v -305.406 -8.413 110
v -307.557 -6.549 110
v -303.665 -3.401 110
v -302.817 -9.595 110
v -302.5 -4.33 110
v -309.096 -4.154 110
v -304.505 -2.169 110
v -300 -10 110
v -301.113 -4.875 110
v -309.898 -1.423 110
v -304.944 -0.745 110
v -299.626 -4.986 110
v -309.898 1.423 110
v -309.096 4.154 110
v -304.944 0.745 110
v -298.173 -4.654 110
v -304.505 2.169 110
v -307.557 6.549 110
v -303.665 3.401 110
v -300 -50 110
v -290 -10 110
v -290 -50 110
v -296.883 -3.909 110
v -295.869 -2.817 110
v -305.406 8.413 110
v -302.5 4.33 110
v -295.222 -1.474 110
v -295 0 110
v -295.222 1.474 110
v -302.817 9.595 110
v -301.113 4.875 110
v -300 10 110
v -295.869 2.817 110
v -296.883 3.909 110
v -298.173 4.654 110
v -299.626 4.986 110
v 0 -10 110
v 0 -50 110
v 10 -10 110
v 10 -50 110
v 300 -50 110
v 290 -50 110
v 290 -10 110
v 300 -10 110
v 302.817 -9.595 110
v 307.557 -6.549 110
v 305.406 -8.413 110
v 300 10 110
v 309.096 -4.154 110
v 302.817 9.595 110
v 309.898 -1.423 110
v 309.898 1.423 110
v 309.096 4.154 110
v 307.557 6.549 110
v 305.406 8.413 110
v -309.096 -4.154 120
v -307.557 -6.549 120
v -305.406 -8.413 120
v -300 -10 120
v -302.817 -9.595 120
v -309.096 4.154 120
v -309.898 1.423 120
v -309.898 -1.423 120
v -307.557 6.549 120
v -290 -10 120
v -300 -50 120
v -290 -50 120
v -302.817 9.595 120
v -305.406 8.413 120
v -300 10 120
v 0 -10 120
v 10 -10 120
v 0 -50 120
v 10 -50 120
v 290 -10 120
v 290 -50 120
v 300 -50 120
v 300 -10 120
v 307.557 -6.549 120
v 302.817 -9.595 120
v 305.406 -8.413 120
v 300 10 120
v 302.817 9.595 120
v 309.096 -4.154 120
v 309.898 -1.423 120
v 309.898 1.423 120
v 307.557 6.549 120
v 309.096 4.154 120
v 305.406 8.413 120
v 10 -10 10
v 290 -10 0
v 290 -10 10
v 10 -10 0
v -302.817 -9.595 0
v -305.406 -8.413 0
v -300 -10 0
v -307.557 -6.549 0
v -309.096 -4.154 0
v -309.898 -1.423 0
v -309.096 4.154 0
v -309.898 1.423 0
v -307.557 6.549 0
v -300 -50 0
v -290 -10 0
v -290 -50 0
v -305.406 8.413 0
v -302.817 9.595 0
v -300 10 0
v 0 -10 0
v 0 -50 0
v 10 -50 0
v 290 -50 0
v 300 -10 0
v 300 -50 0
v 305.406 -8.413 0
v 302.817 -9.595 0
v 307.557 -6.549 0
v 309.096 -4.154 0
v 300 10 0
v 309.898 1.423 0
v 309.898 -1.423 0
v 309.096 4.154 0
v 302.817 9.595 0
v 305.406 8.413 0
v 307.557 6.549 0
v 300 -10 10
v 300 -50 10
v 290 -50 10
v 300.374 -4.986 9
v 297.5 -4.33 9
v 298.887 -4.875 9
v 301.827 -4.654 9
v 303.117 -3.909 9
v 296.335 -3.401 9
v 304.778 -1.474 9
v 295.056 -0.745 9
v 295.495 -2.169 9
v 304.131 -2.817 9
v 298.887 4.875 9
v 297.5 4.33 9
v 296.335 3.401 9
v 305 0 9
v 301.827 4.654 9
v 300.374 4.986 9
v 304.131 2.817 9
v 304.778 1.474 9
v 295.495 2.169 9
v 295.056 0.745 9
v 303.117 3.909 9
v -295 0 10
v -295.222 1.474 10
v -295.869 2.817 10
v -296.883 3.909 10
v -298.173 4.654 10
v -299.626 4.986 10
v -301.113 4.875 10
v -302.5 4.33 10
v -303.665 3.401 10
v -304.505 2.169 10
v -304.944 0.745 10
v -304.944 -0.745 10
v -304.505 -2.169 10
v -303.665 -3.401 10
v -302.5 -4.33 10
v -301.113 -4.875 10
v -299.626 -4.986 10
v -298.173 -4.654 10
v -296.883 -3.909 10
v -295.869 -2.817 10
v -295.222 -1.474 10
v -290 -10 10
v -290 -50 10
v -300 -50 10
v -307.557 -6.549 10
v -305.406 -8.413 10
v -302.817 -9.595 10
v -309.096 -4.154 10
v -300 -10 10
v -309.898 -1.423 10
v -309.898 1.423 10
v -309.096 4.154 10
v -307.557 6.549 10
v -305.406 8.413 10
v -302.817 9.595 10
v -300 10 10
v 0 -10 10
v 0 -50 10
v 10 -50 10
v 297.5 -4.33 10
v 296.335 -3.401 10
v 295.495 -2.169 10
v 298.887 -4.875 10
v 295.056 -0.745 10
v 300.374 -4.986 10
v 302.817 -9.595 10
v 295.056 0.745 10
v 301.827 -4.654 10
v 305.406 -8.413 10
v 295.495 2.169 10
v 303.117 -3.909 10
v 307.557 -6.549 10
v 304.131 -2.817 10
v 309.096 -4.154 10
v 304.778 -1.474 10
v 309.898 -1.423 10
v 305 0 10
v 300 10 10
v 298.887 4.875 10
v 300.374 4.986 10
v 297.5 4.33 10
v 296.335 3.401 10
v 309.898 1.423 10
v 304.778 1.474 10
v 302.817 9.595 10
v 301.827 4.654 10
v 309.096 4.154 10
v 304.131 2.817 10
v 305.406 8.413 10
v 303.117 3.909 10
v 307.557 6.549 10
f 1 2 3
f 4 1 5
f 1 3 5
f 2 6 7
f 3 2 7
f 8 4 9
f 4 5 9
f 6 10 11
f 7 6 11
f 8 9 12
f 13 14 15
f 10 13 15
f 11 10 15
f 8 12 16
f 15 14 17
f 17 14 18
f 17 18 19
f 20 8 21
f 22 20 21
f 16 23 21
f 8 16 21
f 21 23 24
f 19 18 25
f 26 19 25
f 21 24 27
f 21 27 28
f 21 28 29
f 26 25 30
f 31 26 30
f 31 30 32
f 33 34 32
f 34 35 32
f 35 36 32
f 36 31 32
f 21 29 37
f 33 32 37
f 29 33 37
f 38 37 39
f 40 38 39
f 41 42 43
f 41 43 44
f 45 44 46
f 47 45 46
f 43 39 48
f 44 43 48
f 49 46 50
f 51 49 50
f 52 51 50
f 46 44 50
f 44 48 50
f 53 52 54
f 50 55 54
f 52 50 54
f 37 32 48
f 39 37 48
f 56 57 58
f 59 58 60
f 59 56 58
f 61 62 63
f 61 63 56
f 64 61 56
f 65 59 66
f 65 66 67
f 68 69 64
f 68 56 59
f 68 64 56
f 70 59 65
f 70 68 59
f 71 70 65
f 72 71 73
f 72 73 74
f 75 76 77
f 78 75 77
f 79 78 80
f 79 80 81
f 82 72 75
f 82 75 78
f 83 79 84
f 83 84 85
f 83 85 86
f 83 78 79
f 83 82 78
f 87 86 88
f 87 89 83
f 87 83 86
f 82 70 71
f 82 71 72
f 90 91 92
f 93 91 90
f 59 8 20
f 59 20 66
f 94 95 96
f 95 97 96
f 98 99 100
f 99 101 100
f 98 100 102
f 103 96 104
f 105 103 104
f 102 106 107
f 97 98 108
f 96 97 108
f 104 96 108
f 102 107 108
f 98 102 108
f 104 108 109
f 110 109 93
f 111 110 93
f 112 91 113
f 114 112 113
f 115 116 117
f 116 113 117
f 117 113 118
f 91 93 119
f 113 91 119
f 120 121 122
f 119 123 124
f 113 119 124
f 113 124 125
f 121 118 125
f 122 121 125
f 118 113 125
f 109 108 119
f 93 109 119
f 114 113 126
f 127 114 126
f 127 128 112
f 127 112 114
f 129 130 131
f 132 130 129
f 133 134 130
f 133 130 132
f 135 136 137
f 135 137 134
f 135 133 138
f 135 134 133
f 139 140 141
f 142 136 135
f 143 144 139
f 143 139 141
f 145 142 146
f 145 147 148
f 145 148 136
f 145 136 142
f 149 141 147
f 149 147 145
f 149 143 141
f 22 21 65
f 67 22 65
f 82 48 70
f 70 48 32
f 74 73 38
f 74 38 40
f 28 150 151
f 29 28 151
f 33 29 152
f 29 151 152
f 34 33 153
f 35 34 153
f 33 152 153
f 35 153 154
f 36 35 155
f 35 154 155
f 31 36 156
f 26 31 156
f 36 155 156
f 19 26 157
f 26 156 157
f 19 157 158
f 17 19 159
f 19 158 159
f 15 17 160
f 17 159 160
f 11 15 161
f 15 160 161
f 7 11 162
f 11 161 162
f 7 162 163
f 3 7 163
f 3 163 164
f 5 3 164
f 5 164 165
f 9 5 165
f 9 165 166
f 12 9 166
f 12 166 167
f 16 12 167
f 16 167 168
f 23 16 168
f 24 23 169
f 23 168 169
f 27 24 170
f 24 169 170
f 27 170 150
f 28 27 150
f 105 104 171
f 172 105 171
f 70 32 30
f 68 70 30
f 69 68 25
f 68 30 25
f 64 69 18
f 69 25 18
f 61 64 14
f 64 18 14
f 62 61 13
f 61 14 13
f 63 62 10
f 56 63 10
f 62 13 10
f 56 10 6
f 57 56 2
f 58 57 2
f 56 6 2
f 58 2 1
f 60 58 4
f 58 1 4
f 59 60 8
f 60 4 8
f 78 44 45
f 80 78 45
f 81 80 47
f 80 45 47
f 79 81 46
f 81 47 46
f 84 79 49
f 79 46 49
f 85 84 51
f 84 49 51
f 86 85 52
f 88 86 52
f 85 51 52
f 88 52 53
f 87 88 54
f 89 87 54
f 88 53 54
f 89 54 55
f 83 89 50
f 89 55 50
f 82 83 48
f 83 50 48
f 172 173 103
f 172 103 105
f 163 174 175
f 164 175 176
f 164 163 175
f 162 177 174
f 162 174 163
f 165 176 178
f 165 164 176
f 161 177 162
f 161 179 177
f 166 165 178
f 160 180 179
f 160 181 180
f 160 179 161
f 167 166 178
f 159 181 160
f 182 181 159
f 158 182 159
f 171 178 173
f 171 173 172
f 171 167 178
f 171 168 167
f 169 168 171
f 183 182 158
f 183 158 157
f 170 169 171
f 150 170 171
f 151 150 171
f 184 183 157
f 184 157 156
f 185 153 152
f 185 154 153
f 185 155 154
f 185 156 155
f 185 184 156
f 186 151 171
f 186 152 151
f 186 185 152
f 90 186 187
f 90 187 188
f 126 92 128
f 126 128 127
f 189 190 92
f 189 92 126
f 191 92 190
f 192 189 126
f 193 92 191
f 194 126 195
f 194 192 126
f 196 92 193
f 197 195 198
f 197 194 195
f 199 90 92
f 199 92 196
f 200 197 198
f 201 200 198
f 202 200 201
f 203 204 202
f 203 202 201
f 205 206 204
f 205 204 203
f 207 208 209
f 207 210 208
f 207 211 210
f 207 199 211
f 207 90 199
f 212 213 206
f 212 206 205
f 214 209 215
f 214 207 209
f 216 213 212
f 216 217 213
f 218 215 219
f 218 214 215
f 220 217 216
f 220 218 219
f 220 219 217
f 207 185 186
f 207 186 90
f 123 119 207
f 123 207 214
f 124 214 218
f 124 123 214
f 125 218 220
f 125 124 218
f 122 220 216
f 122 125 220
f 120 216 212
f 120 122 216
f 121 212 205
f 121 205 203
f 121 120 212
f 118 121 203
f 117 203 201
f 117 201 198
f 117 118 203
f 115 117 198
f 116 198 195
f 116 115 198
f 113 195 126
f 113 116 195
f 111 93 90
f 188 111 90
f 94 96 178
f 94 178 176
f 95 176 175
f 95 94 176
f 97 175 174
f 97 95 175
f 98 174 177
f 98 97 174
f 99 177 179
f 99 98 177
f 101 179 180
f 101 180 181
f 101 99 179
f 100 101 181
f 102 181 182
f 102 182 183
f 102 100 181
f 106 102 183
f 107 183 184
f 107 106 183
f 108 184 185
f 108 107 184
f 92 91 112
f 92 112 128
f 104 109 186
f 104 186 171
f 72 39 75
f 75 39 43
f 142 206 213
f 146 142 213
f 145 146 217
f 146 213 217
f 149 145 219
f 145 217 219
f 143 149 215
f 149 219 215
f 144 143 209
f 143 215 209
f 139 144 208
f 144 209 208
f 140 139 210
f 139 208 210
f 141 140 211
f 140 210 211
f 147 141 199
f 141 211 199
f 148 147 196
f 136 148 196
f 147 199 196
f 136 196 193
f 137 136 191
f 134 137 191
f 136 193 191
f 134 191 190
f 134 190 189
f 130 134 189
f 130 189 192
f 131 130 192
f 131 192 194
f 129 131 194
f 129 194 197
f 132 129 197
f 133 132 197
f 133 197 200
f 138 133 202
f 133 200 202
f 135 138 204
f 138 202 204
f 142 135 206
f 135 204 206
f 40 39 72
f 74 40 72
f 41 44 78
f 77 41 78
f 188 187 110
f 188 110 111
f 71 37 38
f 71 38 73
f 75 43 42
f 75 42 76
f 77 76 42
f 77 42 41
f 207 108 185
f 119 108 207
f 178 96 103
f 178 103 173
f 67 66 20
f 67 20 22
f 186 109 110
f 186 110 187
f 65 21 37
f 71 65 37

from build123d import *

# Parameters (mm, degrees)
SALIENTE_EXTRUIR1_DEPTH = 10
CROQUIS2_R              = 5
SALIENTE_EXTRUIR2_DEPTH = 100
CROQUIS5_R              = 5
CORTAR_EXTRUIR1_DEPTH   = 1
SALIENTE_EXTRUIR5_DEPTH = 10
CROQUIS7_W              = 10
CROQUIS7_H              = 10
SALIENTE_EXTRUIR6_DEPTH = 40


with BuildPart() as part:
    # Croquis1 → Saliente-Extruir1 (new body)
    with BuildSketch(Plane.XY):
        with BuildLine():
            Line((-300, 10), (300, 10))
            ThreePointArc((300, 10), (310, 0), (300, -10))
            Line((300, -10), (-300, -10))
            ThreePointArc((-300, -10), (-310, 0), (-300, 10))
        make_face()
    extrude(amount=SALIENTE_EXTRUIR1_DEPTH)

    # Croquis2 → Saliente-Extruir2 (add)
    with BuildSketch(Plane.XY.offset(10)):
        with Locations((-300, 0)):
            Circle(CROQUIS2_R)
    extrude(amount=SALIENTE_EXTRUIR2_DEPTH)

    # Croquis5 → Cortar-Extruir1 (cut)
    with BuildSketch(Plane.XY.offset(10)):
        with Locations((300, 0)):
            Circle(CROQUIS5_R)
    extrude(amount=-CORTAR_EXTRUIR1_DEPTH, mode=Mode.SUBTRACT)

    # Croquis6 → Saliente-Extruir5 (add)
    with BuildSketch(Plane.XY.offset(110)):
        with BuildLine():
            Line((-300, -10), (300, -10))
            ThreePointArc((300, -10), (310, 0), (300, 10))
            Line((300, 10), (-300, 10))
            ThreePointArc((-300, 10), (-310, 0), (-300, -10))
        make_face()
    extrude(amount=SALIENTE_EXTRUIR5_DEPTH)

    # Croquis7 → Saliente-Extruir6 (add)
    with BuildSketch(Plane.XZ.offset(10)):
        with Locations((-295, 5)):
            Rectangle(CROQUIS7_W, CROQUIS7_H)
        with Locations((295, 5)):
            Rectangle(CROQUIS7_W, CROQUIS7_H)
        with Locations((295, 115)):
            Rectangle(CROQUIS7_W, CROQUIS7_H)
        with Locations((-295, 115)):
            Rectangle(CROQUIS7_W, CROQUIS7_H)
        with Locations((5, 5)):
            Rectangle(CROQUIS7_W, CROQUIS7_H)
        with Locations((5, 115)):
            Rectangle(CROQUIS7_W, CROQUIS7_H)
    extrude(amount=SALIENTE_EXTRUIR6_DEPTH)


solid = part.part
